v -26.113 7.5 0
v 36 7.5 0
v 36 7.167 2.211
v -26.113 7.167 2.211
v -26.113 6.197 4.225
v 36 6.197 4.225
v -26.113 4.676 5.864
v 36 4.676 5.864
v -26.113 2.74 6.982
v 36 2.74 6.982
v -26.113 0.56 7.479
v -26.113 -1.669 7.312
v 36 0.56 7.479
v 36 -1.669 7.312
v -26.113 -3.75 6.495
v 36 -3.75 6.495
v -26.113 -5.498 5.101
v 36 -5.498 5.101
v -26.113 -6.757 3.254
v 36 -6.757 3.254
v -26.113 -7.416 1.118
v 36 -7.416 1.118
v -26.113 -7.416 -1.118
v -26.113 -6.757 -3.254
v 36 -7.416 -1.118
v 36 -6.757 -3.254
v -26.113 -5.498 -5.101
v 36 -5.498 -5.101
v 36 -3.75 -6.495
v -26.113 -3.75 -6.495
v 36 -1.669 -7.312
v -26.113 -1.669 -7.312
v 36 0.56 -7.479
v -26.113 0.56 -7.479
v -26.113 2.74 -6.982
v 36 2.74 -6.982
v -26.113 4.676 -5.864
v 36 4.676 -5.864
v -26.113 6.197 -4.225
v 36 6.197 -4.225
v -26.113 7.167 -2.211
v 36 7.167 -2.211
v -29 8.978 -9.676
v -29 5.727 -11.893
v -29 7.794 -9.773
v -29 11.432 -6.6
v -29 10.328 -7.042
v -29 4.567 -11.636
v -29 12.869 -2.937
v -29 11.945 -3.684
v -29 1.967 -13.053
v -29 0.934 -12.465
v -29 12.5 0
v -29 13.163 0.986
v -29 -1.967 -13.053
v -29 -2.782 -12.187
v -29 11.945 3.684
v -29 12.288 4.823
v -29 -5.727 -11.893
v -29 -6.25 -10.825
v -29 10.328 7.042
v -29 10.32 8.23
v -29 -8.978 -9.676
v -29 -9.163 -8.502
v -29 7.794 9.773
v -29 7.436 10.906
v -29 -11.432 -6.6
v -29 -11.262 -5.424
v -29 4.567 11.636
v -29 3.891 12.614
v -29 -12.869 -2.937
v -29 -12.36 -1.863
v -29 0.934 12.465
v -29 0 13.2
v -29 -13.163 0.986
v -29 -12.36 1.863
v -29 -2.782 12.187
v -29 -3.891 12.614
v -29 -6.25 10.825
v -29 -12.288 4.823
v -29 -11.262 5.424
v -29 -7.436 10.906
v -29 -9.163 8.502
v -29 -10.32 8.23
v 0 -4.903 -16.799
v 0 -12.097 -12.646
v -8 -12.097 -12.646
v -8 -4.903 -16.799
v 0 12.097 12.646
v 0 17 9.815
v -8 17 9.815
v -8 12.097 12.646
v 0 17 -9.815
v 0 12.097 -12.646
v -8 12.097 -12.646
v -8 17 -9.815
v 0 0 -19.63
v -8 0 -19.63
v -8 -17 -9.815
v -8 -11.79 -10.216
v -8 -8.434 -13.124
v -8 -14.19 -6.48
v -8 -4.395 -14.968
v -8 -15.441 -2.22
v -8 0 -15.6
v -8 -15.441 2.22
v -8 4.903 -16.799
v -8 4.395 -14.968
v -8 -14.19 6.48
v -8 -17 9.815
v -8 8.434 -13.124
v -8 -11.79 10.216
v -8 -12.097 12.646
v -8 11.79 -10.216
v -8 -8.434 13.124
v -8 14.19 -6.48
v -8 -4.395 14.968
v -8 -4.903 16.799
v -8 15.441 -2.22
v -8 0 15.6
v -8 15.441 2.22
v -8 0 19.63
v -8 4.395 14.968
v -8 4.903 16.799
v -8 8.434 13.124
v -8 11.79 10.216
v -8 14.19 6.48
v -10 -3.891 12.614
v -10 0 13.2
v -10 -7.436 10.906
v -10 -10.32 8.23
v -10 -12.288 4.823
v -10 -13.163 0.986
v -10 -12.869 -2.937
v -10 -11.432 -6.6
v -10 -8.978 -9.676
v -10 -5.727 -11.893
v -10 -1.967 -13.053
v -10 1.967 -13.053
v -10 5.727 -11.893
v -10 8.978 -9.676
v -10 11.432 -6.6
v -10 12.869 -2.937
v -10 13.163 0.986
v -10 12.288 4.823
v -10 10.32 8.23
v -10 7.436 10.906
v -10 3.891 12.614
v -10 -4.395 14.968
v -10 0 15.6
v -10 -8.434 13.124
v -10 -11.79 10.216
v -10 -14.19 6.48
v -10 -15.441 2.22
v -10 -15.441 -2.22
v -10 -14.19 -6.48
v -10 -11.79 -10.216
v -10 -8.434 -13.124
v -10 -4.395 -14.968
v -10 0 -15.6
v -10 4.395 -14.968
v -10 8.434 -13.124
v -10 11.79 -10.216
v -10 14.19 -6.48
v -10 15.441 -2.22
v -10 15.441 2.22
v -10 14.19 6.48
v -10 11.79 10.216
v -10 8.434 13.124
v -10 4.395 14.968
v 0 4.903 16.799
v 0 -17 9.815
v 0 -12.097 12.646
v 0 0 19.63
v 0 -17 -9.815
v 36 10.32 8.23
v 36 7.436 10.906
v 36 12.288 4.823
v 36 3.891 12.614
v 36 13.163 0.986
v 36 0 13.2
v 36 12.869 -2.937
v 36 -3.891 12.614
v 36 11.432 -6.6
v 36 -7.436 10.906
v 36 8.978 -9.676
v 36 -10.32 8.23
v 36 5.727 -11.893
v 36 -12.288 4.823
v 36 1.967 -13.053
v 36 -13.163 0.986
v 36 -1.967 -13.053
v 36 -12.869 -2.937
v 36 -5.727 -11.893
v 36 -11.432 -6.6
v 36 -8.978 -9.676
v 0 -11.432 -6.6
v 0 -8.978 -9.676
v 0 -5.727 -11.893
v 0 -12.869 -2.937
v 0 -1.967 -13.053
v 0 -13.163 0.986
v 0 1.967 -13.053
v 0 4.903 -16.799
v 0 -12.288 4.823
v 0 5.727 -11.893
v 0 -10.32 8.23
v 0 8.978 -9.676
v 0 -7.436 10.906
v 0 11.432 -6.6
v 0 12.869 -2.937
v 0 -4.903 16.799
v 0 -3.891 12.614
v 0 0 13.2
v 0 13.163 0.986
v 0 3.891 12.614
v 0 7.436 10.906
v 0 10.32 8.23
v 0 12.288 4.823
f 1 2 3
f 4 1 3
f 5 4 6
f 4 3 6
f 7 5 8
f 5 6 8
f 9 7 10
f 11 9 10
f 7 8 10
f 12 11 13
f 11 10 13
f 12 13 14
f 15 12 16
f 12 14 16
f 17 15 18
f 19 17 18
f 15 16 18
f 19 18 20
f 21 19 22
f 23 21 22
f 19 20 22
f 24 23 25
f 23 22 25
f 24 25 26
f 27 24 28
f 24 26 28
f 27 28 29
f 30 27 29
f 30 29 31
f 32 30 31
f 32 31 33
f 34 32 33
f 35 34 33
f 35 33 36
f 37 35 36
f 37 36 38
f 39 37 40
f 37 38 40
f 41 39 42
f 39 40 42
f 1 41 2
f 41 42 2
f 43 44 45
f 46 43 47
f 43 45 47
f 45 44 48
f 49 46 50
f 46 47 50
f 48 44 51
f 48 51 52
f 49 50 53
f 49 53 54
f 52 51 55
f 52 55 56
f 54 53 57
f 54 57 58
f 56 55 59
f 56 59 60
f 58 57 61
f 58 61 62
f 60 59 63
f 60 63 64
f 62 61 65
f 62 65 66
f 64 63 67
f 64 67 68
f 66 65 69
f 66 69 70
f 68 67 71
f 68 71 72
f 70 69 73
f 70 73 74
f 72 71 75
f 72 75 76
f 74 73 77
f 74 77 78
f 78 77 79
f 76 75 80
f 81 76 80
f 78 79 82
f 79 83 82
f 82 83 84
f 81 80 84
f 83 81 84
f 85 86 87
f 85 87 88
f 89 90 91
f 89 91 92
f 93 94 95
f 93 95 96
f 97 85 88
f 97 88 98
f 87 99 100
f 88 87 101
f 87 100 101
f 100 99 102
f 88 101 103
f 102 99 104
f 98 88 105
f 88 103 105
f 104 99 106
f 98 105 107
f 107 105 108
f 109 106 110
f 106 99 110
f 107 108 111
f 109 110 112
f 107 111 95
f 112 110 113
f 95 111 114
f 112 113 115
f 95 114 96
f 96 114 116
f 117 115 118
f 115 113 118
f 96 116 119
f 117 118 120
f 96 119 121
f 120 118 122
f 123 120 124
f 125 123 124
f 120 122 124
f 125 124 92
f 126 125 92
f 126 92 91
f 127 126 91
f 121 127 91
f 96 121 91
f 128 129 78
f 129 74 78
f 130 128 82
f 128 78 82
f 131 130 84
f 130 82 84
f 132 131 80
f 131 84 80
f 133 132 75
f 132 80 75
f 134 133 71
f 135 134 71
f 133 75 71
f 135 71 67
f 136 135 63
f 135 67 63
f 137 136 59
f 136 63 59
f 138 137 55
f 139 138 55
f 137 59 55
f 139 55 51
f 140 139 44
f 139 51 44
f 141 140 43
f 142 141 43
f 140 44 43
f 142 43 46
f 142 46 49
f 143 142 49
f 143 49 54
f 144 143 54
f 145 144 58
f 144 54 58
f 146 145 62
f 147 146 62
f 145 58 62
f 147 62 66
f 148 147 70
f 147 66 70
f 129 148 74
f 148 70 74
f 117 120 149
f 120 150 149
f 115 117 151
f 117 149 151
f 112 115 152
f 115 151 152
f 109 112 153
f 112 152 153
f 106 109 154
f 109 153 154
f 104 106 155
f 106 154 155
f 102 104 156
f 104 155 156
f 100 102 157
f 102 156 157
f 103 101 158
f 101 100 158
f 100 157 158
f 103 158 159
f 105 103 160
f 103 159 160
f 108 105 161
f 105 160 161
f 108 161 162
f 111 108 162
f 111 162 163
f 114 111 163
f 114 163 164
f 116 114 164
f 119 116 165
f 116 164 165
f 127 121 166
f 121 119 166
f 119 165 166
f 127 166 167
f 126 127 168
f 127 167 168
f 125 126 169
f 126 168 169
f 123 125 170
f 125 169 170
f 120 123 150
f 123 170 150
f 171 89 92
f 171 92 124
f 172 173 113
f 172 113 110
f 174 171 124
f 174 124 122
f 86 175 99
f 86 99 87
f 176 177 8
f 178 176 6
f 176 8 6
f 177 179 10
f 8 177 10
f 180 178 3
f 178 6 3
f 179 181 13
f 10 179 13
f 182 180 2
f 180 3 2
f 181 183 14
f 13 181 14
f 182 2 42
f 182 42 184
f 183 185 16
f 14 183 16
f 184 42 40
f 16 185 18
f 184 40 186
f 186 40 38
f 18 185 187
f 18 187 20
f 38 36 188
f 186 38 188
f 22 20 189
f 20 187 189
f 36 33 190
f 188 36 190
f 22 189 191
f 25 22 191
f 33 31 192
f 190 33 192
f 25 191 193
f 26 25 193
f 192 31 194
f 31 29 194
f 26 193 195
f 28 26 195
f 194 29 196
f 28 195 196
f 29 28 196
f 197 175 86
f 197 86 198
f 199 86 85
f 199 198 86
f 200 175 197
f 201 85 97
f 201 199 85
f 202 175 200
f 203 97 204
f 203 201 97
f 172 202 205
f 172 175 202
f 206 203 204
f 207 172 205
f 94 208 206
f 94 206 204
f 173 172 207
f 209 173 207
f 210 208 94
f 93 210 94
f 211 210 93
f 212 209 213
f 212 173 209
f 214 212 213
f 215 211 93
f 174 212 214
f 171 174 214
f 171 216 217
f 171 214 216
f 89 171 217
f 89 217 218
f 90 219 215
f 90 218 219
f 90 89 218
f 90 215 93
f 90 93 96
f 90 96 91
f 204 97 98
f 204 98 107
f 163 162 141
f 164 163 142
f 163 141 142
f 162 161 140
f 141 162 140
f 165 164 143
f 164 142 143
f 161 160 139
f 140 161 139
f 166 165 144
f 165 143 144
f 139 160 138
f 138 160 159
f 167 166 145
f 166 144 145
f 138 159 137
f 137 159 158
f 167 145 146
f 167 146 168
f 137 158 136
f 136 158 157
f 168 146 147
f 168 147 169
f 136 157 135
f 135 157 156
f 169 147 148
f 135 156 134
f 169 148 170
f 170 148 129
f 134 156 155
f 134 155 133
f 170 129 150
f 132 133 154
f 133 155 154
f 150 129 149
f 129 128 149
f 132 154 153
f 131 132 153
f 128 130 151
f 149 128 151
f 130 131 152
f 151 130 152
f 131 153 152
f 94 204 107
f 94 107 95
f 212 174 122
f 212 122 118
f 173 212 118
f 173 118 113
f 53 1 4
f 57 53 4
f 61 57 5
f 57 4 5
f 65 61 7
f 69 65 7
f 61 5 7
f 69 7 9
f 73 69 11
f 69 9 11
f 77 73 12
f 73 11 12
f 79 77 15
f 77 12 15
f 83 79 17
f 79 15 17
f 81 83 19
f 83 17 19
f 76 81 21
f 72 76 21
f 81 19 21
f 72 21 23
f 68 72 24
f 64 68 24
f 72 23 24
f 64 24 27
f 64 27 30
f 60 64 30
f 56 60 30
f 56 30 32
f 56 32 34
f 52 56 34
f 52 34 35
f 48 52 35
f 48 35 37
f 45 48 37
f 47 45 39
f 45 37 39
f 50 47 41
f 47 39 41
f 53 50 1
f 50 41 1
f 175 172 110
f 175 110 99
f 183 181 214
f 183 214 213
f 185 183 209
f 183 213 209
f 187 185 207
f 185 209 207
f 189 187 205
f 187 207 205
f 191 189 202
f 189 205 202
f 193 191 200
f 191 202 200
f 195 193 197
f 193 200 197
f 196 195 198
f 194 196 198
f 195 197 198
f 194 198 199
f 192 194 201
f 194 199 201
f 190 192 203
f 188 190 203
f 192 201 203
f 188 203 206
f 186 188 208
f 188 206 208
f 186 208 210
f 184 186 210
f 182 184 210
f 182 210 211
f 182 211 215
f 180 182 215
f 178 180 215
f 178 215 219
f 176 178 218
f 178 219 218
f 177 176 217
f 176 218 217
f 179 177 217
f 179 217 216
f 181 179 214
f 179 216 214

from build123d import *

# Parameters (mm, degrees)
F2_R     = 7.5
F3_DEPTH = 65.001
F4_R     = 7.5
F5_DEPTH = 8
F6_SIZE2 = 2.8867513459
F6_SIZE  = 5


with BuildPart() as f1:
    # F0 (on Front) → F1 (revolve)
    with BuildSketch(Plane.XZ):
        Polygon((-29, 13.2), (-29, 0), (36, 0), (36, 13.2), (0, 13.2), (0, 15.6), (-10, 15.6), (-10, 13.2), align=None)
    revolve(axis=Axis((5.8021252709, 0, 0), (1, 0, 0)))

    # F2 (on face) → F3 (cut, through all)
    with BuildSketch(Plane.YZ.offset(36)):
        Circle(F2_R)
    extrude(amount=-F3_DEPTH, mode=Mode.SUBTRACT)

    # F4 (on Right) → F5 (join)
    with BuildSketch(Plane.YZ):
        with BuildLine():
            Line((-17, 4.1533119315), (-17, -4.1533119315))
            ThreePointArc((-17, -4.1533119315), (-15.1554445662, -8.75), (-12.0968736425, -12.6457758986))
            Line((-12.0968736425, -12.6457758986), (-4.9031263575, -16.7990878301))
            ThreePointArc((-4.9031263575, -16.7990878301), (0, -17.5), (4.9031263575, -16.7990878301))
            Line((4.9031263575, -16.7990878301), (12.0968736425, -12.6457758986))
            ThreePointArc((12.0968736425, -12.6457758986), (15.1554445662, -8.75), (17, -4.1533119315))
            Line((17, -4.1533119315), (17, 4.1533119315))
            ThreePointArc((17, 4.1533119315), (15.1554445662, 8.75), (12.0968736425, 12.6457758986))
            Line((12.0968736425, 12.6457758986), (4.9031263575, 16.7990878301))
            ThreePointArc((4.9031263575, 16.7990878301), (0, 17.5), (-4.9031263575, 16.7990878301))
            Line((-4.9031263575, 16.7990878301), (-12.0968736425, 12.6457758986))
            ThreePointArc((-12.0968736425, 12.6457758986), (-15.1554445662, 8.75), (-17, 4.1533119315))
        make_face()
        Circle(F4_R, mode=Mode.SUBTRACT)
        with BuildLine():
            Line((-17, 9.8149545762), (-17, 4.1533119315))
            ThreePointArc((-17, 4.1533119315), (-15.1554445662, 8.75), (-12.0968736425, 12.6457758986))
            Line((-12.0968736425, 12.6457758986), (-17, 9.8149545762))
        make_face()
        with BuildLine():
            Line((-17, -4.1533119315), (-17, -9.8149545762))
            Line((-17, -9.8149545762), (-12.0968736425, -12.6457758986))
            ThreePointArc((-12.0968736425, -12.6457758986), (-15.1554445662, -8.75), (-17, -4.1533119315))
        make_face()
        with BuildLine():
            ThreePointArc((4.9031263575, -16.7990878301), (0, -17.5), (-4.9031263575, -16.7990878301))
            Line((-4.9031263575, -16.7990878301), (0, -19.6299091524))
            Line((0, -19.6299091524), (4.9031263575, -16.7990878301))
        make_face()
        with BuildLine():
            ThreePointArc((17, -4.1533119315), (15.1554445662, -8.75), (12.0968736425, -12.6457758986))
            Line((12.0968736425, -12.6457758986), (17, -9.8149545762))
            Line((17, -9.8149545762), (17, -4.1533119315))
        make_face()
        with BuildLine():
            Line((17, 9.8149545762), (12.0968736425, 12.6457758986))
            ThreePointArc((12.0968736425, 12.6457758986), (15.1554445662, 8.75), (17, 4.1533119315))
            Line((17, 4.1533119315), (17, 9.8149545762))
        make_face()
        with BuildLine():
            Line((0, 19.6299091524), (-4.9031263575, 16.7990878301))
            ThreePointArc((-4.9031263575, 16.7990878301), (0, 17.5), (4.9031263575, 16.7990878301))
            Line((4.9031263575, 16.7990878301), (0, 19.6299091524))
        make_face()
    extrude(amount=-F5_DEPTH)

    # F6
    f6_edges = [f1.edges().sort_by_distance(p)[0] for p in [
        (-29, -7.5, 0),
    ]]
    chamfer(f6_edges, length=F6_SIZE, length2=F6_SIZE2)


solid = f1.part
